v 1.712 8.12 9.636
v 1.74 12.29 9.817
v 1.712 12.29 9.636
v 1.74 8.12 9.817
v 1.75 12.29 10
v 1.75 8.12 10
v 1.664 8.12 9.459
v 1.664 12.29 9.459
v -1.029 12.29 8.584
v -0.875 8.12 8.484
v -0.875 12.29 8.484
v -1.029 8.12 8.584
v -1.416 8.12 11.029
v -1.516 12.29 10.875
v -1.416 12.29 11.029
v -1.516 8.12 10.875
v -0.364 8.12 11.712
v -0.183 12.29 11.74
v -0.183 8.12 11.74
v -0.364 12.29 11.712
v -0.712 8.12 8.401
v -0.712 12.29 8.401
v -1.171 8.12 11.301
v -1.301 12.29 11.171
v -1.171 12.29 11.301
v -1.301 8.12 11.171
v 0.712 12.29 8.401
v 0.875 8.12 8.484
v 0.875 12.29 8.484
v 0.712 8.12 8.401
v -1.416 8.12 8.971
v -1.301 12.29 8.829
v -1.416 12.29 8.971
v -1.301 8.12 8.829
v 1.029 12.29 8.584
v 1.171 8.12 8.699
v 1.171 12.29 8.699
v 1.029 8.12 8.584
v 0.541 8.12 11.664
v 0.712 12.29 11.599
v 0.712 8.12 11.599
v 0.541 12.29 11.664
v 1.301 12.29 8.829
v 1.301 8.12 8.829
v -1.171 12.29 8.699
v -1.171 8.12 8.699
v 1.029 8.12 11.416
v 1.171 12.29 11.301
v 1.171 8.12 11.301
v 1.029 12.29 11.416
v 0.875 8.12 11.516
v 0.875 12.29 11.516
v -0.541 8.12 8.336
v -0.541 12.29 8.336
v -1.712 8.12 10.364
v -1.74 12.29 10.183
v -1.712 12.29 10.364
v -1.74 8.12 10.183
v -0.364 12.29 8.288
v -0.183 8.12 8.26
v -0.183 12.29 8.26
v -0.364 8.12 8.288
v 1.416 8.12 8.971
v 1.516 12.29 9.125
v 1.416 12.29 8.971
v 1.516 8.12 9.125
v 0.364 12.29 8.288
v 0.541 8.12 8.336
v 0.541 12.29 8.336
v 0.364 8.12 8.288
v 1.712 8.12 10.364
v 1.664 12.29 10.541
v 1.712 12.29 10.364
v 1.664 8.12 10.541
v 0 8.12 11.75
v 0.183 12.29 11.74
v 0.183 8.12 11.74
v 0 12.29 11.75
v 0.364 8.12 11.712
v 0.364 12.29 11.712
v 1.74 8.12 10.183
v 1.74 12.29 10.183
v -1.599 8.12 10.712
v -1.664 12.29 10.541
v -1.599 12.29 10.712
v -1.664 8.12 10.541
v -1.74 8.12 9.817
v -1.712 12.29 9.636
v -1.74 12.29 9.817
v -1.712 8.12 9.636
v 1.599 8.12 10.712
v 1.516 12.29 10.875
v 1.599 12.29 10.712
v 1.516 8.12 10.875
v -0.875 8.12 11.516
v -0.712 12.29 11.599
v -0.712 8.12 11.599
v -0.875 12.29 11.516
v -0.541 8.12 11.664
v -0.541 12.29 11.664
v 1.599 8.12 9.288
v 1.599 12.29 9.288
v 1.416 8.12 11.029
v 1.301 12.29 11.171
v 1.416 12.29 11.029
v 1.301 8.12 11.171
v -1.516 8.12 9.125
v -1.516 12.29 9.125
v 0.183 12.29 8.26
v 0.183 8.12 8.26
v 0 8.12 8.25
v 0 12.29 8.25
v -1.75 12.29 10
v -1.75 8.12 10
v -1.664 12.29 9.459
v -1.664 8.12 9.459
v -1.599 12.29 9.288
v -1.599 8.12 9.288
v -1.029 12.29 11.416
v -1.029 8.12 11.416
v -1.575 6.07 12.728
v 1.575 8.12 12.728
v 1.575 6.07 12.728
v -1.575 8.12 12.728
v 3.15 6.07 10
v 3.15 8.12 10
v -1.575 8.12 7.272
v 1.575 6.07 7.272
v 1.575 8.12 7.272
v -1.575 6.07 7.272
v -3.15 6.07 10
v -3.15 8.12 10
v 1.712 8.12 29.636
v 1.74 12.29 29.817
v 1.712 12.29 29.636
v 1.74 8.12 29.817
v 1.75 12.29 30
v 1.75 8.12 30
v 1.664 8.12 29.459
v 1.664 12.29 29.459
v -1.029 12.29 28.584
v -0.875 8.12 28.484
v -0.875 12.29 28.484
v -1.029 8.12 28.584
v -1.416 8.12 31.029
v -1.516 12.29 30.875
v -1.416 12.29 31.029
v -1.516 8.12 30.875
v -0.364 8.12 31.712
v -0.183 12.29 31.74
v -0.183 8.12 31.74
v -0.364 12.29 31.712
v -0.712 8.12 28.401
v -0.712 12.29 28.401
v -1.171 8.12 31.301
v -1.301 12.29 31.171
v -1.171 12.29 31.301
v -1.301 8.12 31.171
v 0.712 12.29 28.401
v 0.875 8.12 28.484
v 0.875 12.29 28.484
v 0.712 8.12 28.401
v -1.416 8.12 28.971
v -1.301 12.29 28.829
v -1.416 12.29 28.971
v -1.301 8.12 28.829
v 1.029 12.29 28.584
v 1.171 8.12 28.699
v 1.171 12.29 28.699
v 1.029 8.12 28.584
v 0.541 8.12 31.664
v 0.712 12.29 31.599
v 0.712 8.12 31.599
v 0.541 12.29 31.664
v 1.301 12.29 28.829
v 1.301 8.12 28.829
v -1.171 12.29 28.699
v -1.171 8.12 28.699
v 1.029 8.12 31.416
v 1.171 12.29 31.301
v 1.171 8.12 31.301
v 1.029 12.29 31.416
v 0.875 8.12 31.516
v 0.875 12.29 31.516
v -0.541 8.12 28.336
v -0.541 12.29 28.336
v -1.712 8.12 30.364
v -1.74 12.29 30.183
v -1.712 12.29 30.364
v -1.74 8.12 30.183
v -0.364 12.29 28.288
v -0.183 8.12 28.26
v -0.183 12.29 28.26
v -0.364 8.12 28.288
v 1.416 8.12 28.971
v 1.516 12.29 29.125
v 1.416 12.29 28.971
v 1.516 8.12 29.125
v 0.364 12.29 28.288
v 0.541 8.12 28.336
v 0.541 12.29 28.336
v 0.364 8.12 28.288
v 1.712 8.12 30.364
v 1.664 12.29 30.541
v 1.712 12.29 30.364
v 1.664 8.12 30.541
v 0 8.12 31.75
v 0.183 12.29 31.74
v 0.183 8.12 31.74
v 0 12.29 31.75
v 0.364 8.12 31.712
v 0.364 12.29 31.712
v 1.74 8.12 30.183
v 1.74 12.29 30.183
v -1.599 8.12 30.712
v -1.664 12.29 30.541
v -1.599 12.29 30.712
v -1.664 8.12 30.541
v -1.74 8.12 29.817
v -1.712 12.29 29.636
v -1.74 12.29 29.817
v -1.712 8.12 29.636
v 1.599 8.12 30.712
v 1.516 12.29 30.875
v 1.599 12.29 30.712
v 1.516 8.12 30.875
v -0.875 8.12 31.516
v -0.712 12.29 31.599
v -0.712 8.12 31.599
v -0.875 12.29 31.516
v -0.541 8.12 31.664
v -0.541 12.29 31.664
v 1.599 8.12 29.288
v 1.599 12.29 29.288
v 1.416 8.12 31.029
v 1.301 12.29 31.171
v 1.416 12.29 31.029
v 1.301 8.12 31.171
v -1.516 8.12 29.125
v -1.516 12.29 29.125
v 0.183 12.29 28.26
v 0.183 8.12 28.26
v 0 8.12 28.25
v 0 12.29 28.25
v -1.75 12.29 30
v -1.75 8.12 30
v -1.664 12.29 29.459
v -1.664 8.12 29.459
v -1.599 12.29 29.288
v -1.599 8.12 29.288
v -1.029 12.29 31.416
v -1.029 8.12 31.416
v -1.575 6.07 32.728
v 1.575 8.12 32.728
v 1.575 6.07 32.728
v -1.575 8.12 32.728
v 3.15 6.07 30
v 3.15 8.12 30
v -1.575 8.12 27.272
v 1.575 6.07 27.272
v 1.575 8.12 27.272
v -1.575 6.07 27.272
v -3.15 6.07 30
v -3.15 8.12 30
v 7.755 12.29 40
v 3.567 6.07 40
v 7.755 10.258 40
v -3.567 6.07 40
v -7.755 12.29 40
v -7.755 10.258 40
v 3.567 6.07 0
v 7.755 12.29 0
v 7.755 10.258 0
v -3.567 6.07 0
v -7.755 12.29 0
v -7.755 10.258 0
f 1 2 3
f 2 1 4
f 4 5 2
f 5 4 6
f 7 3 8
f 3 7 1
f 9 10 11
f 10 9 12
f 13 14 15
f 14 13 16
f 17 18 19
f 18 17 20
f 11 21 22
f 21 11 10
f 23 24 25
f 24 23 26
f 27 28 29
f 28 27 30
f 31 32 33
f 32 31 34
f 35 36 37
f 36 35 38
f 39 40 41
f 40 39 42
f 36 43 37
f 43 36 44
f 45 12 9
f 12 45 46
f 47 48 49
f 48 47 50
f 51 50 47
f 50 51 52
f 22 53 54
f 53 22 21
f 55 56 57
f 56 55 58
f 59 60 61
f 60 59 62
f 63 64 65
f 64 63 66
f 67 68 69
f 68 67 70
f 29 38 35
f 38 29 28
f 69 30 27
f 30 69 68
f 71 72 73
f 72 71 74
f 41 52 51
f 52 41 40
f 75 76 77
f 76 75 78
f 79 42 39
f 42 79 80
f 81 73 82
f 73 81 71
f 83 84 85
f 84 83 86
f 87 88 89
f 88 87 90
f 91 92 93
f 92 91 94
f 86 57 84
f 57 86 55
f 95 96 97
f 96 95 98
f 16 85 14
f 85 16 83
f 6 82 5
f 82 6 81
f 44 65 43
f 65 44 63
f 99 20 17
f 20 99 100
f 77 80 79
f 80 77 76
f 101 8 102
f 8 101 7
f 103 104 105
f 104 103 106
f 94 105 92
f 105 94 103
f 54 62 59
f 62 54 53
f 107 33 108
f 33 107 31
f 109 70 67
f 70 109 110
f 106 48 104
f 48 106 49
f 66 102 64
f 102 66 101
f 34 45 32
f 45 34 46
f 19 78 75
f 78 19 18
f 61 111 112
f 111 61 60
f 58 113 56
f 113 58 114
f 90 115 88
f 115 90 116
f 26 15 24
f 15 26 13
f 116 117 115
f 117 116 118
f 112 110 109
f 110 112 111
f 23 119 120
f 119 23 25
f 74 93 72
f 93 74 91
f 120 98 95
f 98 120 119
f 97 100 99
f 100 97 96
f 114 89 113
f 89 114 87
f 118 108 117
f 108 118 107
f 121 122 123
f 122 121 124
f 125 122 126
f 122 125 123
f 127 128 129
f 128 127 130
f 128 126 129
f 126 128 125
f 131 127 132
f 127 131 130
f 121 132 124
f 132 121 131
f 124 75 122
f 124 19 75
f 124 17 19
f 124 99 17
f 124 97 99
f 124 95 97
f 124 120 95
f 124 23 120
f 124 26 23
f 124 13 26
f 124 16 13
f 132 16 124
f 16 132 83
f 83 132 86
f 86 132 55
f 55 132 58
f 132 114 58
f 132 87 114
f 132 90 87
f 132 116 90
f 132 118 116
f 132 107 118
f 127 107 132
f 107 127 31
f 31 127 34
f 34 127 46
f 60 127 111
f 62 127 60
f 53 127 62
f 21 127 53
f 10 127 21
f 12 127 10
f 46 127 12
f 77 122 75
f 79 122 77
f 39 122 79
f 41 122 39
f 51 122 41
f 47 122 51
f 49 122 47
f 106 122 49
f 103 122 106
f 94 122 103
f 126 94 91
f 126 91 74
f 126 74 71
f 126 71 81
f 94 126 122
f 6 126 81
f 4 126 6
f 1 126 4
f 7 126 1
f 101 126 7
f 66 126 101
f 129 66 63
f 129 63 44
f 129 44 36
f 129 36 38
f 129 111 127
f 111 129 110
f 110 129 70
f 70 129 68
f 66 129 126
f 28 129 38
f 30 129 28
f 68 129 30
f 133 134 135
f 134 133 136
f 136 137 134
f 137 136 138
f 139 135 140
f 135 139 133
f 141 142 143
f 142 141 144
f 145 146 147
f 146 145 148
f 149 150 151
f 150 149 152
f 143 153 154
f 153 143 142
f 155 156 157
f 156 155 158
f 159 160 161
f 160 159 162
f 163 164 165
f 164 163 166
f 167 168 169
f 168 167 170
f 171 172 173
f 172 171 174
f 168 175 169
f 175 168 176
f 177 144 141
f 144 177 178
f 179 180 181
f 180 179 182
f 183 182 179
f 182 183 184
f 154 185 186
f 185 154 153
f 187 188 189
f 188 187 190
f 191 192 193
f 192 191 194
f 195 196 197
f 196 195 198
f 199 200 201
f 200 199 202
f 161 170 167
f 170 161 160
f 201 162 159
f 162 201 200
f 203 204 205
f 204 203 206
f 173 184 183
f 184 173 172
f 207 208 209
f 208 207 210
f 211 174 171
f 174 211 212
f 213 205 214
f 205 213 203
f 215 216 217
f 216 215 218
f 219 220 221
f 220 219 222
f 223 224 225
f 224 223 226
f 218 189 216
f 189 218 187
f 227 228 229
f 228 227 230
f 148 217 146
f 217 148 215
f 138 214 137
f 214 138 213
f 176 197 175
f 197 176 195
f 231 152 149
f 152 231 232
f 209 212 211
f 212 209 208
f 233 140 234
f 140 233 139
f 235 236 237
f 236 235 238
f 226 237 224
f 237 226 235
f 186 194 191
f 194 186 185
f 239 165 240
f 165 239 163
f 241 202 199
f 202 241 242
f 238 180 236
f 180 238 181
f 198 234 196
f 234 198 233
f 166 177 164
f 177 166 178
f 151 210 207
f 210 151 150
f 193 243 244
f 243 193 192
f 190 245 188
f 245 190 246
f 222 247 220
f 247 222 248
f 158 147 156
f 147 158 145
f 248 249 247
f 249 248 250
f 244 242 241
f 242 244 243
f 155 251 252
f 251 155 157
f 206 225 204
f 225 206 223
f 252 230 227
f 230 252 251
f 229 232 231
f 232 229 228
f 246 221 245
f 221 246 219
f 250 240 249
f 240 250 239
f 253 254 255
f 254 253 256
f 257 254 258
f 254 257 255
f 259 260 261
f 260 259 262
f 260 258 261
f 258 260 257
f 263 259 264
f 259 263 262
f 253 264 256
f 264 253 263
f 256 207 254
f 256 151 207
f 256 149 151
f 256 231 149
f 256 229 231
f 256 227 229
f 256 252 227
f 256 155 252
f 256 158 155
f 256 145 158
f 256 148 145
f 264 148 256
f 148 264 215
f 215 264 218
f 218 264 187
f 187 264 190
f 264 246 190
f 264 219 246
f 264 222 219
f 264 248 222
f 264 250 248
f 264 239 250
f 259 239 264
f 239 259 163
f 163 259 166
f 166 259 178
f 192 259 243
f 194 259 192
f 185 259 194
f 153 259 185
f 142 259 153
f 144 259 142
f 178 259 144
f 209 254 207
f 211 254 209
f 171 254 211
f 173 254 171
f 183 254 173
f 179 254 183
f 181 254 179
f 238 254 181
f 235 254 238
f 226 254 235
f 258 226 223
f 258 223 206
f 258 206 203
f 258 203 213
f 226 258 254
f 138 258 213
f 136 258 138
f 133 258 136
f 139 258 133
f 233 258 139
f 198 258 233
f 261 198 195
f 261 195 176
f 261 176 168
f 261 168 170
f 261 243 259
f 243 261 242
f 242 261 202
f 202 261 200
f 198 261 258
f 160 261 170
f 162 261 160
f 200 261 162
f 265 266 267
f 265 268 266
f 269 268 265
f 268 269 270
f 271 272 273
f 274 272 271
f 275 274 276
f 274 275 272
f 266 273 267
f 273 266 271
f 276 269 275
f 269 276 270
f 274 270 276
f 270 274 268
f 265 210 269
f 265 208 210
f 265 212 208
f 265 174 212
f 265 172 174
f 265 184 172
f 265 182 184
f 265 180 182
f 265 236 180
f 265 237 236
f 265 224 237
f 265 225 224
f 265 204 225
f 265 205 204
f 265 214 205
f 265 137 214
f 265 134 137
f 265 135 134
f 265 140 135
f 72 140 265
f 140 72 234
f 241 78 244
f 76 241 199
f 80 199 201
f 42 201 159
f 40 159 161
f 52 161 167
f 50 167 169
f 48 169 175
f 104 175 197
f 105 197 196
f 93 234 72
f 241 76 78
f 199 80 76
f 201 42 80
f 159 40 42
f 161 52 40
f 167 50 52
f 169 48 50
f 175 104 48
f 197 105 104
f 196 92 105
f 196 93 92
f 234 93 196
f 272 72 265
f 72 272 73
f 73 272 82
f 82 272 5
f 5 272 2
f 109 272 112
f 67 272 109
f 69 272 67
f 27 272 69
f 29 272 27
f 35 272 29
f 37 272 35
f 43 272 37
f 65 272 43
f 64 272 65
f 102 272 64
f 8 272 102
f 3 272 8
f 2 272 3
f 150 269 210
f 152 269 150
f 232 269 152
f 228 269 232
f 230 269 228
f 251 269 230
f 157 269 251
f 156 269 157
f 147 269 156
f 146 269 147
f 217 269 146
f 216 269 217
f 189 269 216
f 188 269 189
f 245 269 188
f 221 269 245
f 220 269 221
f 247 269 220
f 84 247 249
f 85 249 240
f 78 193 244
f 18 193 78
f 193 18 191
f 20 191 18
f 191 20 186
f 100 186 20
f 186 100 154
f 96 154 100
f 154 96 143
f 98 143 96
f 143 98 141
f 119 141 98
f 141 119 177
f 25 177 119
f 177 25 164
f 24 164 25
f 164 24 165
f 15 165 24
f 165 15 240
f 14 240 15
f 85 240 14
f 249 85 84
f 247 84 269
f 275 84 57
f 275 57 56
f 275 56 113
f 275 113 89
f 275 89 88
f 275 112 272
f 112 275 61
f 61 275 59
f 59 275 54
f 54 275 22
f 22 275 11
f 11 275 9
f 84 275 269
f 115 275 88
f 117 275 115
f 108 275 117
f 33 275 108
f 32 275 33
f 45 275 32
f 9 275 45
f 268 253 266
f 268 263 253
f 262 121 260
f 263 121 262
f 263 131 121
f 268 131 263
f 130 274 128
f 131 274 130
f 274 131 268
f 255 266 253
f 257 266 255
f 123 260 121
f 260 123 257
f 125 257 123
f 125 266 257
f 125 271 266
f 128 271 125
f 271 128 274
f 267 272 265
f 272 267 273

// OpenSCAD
// increases to tighten, decrease to loosen
tol=.5; 
length=40;

size="30"; // [20:20mm,30:30mm]
screw_hole_diameter=3;
// from furthest corners
nut_diameter=6.3; 
nut_depth=2.3;
num_screws=2;
screw_spacing=20;
initial_screw_offset=10;

connector((size=="30")?30:20);

module connector(size) {
  base_size=size;
  edge_width=(size==30)?2.21:1.5;
  top_width=(size==30)?16.51:11.99;
  cross_width=(size==30)?2.54:1.5;
  core_size=(size==30)?11.64:7.32; 

  $fn=60;
  top_width_tol=top_width-tol*2;
  edge_width_tol=edge_width+tol;
  cross_width_tol=cross_width+tol*2;
  core_size_tol=core_size+tol;

  difference() {
    linear_extrude(length)
      sketch();   
    screw_holes();
  }  

  module screw_holes() {  
    for(i=[0:screw_spacing:screw_spacing*num_screws-1]) {
      translate([0,core_size/2,initial_screw_offset+i])
        rotate([270,0,0])  
          screw_hole();  
    }
  }
    
  module screw_hole() {
    cylinder(d=screw_hole_diameter+tol,h=50);
    cylinder(h=nut_depth, $fn=6, d=nut_diameter);
  }  

  module sketch() {
    difference() {
      base();
      cross_beams();
      core();
      corner_cut();
    }
    
    module core() {
      square(core_size_tol, true);
    }

    module corner_cut() {
      corner_size=(base_size-top_width_tol)/2;
      translate([-base_size/2,base_size/2-corner_size,0])
        square(corner_size);    
      translate([base_size/2-corner_size,base_size/2-corner_size,0])
        square(corner_size);  
    }

    module base() { 
      translate([-base_size/2,0,0])
        square([base_size,base_size/2-edge_width_tol]);
    }

    module cross_beams() {
      rotate([0,0,-45])
        translate([-cross_width_tol/2,0,0])
          square(30);
      
      rotate([0,0,45])
        translate([-30+cross_width_tol/2,0,0])
          square(30);
    }
  }
}
